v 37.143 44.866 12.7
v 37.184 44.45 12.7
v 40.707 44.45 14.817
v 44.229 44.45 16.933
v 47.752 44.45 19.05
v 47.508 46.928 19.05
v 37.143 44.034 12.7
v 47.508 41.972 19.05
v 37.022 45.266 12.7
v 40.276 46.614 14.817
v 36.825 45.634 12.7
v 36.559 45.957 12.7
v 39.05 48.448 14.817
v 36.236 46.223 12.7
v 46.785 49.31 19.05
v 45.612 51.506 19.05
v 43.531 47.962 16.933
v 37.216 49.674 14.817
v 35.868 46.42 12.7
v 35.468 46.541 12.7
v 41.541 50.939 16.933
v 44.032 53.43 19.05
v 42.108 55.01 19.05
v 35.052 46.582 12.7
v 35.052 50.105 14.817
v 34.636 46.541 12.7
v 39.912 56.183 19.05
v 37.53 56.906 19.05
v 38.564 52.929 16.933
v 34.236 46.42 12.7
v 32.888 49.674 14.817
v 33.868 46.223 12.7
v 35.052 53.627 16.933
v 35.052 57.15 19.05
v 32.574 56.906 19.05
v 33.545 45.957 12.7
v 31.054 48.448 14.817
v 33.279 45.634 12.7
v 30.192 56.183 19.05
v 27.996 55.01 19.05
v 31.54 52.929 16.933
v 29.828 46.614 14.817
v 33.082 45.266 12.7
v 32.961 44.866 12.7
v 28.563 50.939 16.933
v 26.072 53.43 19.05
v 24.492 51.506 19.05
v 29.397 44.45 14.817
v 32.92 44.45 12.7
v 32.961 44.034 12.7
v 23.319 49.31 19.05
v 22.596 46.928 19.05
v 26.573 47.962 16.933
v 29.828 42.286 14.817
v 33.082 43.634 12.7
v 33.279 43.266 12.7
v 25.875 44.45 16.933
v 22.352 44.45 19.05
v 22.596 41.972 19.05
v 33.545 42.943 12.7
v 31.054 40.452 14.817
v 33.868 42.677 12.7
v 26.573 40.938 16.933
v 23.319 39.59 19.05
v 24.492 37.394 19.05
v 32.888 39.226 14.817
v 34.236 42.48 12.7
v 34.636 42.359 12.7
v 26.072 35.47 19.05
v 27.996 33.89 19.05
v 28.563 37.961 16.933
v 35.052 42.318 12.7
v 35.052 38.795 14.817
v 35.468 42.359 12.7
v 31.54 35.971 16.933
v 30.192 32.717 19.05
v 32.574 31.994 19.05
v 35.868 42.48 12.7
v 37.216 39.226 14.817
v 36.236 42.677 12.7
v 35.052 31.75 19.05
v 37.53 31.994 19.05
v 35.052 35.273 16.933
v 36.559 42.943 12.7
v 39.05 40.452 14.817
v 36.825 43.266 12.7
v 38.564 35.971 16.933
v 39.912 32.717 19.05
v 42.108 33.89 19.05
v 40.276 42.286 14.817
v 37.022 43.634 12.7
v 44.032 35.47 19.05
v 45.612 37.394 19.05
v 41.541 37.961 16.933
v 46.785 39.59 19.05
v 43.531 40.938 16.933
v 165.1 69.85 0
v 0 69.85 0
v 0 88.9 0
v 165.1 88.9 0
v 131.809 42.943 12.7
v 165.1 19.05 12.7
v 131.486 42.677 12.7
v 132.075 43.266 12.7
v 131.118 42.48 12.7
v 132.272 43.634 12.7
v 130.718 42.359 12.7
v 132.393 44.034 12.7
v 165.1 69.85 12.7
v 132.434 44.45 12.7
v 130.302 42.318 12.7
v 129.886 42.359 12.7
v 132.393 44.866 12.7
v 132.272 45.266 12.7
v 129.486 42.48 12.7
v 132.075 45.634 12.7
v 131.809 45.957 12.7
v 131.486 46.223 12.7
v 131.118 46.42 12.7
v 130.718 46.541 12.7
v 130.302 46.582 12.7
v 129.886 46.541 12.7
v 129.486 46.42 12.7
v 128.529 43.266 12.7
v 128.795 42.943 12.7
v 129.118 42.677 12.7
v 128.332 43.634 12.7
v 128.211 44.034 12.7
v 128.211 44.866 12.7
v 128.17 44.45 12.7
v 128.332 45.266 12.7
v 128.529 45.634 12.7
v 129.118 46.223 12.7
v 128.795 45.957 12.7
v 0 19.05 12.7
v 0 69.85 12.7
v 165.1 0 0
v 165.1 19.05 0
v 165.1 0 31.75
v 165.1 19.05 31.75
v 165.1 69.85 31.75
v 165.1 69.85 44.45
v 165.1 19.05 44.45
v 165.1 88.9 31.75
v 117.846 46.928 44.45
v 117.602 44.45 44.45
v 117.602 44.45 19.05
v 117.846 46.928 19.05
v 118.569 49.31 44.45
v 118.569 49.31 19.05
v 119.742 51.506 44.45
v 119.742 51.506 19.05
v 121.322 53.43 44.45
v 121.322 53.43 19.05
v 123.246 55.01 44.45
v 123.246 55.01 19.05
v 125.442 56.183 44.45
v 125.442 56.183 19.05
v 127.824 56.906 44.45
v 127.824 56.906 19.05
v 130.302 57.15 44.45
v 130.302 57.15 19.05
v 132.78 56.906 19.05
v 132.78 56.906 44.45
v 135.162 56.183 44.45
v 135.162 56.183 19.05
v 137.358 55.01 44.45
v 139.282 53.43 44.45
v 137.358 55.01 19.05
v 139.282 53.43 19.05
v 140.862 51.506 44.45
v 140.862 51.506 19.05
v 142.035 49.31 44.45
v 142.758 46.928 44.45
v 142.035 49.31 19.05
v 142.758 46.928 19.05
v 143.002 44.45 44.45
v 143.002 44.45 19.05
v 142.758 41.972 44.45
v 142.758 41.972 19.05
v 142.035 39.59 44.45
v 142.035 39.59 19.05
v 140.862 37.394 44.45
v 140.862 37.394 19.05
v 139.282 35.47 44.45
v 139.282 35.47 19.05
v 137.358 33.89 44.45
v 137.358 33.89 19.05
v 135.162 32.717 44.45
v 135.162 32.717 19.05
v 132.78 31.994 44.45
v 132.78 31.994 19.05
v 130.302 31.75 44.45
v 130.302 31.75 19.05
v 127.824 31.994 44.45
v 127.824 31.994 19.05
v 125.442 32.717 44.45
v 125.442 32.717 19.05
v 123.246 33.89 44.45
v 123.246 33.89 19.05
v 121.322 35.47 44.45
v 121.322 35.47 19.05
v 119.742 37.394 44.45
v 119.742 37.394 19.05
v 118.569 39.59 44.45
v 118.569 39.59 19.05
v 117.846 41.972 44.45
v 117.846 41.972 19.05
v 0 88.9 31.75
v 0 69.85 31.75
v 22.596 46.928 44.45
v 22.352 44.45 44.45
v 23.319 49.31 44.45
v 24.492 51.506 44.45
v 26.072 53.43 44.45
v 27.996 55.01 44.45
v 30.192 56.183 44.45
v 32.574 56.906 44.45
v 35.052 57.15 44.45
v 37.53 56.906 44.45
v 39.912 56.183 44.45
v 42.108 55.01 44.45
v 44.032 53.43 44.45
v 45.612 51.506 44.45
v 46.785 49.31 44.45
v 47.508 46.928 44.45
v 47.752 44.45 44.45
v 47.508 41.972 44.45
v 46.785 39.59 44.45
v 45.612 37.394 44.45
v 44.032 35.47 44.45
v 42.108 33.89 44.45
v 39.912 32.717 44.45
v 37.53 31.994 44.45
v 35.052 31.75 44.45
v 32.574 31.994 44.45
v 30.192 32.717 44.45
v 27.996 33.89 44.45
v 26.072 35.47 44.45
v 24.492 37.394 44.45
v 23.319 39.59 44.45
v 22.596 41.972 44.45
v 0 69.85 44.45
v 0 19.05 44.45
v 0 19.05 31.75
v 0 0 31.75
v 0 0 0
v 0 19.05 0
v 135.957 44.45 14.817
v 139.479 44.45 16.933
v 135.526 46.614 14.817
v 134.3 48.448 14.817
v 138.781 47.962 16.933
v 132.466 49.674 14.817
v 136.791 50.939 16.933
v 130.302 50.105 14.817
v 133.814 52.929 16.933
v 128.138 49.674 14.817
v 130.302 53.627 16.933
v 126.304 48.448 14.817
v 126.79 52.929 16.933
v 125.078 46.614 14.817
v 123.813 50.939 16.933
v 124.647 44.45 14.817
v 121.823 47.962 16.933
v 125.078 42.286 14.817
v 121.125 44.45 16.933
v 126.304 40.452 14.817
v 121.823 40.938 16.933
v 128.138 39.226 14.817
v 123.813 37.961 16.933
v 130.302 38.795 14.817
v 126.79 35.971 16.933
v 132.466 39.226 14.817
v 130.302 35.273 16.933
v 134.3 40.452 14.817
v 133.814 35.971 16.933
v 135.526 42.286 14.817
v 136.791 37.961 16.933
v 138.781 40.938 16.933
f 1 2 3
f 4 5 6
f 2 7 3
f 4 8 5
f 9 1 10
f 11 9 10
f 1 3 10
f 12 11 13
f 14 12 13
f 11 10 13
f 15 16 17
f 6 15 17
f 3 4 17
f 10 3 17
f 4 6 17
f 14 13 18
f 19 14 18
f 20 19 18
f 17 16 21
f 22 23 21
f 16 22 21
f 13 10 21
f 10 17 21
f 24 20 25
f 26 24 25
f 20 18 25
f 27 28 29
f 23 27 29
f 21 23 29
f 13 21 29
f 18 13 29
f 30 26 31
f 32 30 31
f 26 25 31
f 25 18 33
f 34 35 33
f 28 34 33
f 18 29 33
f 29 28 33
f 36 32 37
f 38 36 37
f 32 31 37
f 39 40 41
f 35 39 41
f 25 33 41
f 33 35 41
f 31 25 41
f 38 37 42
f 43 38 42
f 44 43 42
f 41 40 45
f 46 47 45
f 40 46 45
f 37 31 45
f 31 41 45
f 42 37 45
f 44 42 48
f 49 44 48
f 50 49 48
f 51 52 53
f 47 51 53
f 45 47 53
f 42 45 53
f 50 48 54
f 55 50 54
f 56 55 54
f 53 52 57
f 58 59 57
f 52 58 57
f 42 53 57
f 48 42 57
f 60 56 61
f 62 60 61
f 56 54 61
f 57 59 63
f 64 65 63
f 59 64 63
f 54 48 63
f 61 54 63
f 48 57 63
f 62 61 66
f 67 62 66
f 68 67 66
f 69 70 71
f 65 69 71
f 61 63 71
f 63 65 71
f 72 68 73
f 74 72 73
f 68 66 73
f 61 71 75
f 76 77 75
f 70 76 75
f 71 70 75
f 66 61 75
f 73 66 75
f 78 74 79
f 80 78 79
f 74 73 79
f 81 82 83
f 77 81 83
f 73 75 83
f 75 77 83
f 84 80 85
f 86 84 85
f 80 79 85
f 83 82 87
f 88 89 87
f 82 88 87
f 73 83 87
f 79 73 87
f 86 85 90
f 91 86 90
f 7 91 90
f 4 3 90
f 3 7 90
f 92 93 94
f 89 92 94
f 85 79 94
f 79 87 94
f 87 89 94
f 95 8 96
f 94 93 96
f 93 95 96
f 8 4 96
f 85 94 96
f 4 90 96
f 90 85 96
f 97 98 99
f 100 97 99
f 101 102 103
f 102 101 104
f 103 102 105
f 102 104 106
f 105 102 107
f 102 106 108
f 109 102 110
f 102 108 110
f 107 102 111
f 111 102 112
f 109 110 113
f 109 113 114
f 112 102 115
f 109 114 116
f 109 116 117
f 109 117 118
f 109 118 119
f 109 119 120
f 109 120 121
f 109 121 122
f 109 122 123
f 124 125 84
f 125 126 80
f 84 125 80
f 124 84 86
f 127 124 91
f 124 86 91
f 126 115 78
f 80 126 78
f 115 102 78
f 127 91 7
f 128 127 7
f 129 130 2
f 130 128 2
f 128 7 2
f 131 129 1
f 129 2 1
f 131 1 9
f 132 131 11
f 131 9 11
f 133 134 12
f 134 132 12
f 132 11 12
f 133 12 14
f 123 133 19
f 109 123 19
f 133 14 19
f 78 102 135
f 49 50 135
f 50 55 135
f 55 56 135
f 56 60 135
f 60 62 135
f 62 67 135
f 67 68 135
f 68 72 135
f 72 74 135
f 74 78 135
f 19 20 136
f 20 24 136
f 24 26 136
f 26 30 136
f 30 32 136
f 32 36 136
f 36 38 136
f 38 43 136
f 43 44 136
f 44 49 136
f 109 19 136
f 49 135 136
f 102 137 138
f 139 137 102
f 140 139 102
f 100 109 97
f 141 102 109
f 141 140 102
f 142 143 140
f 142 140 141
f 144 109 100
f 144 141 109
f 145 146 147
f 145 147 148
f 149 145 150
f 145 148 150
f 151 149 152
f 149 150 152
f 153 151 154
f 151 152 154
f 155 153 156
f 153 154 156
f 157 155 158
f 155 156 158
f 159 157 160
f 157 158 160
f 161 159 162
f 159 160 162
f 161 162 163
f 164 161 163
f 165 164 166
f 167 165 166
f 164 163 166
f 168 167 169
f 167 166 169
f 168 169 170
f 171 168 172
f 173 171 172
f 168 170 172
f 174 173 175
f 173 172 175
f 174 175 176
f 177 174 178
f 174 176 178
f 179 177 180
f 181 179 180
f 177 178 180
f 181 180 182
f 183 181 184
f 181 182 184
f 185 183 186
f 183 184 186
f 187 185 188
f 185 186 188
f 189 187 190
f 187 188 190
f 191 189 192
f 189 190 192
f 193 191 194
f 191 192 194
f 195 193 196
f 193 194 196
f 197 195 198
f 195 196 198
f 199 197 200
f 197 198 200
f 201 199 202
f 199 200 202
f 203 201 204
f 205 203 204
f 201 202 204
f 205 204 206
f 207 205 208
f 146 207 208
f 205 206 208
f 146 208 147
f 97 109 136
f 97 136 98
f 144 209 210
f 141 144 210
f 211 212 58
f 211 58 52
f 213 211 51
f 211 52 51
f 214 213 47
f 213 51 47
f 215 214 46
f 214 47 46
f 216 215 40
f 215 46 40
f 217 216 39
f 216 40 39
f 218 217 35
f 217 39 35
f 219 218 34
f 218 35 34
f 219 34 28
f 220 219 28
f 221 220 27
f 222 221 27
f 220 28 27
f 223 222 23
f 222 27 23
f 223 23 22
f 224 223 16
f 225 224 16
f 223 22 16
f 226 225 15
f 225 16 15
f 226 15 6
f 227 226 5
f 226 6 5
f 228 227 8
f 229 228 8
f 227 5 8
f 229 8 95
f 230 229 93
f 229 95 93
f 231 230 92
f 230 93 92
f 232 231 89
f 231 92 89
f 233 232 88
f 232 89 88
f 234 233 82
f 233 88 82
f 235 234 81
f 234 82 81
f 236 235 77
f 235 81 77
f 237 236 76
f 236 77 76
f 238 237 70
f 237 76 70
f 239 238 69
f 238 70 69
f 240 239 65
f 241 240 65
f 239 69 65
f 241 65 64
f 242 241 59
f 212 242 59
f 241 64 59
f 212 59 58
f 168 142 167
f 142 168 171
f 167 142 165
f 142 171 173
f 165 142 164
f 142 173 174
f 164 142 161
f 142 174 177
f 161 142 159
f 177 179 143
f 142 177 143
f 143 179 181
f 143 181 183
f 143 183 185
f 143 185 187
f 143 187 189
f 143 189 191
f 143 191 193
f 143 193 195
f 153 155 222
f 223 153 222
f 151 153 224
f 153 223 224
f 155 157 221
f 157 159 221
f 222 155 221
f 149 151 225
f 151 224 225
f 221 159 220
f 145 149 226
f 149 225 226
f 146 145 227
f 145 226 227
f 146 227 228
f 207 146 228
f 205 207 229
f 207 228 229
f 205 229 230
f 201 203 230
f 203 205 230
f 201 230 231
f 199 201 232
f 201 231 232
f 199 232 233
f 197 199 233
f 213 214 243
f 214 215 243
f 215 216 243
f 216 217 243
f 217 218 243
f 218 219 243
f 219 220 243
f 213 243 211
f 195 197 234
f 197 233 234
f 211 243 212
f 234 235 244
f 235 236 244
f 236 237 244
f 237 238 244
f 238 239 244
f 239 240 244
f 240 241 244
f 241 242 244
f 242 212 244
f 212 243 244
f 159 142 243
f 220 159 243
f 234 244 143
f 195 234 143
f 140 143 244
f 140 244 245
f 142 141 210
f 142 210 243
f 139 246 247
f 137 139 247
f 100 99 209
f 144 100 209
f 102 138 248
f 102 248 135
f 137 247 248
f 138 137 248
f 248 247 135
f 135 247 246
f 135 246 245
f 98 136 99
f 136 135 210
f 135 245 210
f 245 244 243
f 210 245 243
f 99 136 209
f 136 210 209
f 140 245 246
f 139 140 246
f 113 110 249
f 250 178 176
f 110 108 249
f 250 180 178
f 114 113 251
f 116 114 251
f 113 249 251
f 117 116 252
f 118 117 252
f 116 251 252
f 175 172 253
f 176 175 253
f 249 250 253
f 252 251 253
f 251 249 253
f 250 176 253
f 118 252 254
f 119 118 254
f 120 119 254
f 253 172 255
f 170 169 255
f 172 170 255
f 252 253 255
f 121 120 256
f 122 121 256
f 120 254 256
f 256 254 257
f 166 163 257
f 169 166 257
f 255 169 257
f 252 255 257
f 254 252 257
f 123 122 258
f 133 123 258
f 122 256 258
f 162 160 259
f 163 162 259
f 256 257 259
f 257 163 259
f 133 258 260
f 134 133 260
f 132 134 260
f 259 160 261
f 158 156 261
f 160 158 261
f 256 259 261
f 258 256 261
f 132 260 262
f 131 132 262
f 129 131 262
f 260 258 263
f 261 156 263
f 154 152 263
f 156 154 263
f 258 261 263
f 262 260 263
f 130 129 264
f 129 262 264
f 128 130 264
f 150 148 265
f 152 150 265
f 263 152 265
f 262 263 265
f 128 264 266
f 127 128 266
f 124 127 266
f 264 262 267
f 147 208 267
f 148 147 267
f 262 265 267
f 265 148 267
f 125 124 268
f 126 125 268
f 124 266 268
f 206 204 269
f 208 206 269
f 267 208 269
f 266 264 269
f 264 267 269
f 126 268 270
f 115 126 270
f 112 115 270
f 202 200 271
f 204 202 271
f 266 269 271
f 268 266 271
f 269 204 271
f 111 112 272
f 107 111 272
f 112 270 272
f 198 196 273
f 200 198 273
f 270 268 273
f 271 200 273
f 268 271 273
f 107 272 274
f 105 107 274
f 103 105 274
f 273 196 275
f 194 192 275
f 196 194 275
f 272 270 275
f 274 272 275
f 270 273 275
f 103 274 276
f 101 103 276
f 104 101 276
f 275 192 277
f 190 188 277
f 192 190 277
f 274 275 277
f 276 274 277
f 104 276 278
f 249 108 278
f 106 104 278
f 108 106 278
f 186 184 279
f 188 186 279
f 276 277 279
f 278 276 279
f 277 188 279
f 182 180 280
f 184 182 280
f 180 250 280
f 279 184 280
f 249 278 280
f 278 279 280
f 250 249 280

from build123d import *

# Parameters (mm, degrees)
F1_DEPTH = 165.1
F3_D     = 25.4
F3_DEPTH = 25.4
F3_TIP   = 7.6309298617


with BuildPart() as f1:
    # F0 (on Right) → F1 (new body)
    with BuildSketch(Plane.YZ):
        Polygon((0, 31.75), (0, 0), (19.05, 0), (19.05, 12.7), (19.05, 31.75), align=None)
        Polygon((19.05, 31.75), (19.05, 12.7), (69.85, 12.7), (69.85, 31.75), (69.85, 44.45), (19.05, 44.45), align=None)
        Polygon((69.85, 12.7), (69.85, 0), (88.9, 0), (88.9, 31.75), (69.85, 31.75), align=None)
    extrude(amount=F1_DEPTH)

    # F3
    with Locations(Plane.XY.offset(44.45)):
        with Locations((130.302, 44.45), (35.052, 44.45)):
            Hole(F3_D / 2, depth=F3_DEPTH)
            with Locations((0, 0, -(F3_DEPTH + F3_TIP / 2))):  # 118° drill point
                Cone(0, F3_D / 2, F3_TIP, mode=Mode.SUBTRACT)


solid = f1.part
